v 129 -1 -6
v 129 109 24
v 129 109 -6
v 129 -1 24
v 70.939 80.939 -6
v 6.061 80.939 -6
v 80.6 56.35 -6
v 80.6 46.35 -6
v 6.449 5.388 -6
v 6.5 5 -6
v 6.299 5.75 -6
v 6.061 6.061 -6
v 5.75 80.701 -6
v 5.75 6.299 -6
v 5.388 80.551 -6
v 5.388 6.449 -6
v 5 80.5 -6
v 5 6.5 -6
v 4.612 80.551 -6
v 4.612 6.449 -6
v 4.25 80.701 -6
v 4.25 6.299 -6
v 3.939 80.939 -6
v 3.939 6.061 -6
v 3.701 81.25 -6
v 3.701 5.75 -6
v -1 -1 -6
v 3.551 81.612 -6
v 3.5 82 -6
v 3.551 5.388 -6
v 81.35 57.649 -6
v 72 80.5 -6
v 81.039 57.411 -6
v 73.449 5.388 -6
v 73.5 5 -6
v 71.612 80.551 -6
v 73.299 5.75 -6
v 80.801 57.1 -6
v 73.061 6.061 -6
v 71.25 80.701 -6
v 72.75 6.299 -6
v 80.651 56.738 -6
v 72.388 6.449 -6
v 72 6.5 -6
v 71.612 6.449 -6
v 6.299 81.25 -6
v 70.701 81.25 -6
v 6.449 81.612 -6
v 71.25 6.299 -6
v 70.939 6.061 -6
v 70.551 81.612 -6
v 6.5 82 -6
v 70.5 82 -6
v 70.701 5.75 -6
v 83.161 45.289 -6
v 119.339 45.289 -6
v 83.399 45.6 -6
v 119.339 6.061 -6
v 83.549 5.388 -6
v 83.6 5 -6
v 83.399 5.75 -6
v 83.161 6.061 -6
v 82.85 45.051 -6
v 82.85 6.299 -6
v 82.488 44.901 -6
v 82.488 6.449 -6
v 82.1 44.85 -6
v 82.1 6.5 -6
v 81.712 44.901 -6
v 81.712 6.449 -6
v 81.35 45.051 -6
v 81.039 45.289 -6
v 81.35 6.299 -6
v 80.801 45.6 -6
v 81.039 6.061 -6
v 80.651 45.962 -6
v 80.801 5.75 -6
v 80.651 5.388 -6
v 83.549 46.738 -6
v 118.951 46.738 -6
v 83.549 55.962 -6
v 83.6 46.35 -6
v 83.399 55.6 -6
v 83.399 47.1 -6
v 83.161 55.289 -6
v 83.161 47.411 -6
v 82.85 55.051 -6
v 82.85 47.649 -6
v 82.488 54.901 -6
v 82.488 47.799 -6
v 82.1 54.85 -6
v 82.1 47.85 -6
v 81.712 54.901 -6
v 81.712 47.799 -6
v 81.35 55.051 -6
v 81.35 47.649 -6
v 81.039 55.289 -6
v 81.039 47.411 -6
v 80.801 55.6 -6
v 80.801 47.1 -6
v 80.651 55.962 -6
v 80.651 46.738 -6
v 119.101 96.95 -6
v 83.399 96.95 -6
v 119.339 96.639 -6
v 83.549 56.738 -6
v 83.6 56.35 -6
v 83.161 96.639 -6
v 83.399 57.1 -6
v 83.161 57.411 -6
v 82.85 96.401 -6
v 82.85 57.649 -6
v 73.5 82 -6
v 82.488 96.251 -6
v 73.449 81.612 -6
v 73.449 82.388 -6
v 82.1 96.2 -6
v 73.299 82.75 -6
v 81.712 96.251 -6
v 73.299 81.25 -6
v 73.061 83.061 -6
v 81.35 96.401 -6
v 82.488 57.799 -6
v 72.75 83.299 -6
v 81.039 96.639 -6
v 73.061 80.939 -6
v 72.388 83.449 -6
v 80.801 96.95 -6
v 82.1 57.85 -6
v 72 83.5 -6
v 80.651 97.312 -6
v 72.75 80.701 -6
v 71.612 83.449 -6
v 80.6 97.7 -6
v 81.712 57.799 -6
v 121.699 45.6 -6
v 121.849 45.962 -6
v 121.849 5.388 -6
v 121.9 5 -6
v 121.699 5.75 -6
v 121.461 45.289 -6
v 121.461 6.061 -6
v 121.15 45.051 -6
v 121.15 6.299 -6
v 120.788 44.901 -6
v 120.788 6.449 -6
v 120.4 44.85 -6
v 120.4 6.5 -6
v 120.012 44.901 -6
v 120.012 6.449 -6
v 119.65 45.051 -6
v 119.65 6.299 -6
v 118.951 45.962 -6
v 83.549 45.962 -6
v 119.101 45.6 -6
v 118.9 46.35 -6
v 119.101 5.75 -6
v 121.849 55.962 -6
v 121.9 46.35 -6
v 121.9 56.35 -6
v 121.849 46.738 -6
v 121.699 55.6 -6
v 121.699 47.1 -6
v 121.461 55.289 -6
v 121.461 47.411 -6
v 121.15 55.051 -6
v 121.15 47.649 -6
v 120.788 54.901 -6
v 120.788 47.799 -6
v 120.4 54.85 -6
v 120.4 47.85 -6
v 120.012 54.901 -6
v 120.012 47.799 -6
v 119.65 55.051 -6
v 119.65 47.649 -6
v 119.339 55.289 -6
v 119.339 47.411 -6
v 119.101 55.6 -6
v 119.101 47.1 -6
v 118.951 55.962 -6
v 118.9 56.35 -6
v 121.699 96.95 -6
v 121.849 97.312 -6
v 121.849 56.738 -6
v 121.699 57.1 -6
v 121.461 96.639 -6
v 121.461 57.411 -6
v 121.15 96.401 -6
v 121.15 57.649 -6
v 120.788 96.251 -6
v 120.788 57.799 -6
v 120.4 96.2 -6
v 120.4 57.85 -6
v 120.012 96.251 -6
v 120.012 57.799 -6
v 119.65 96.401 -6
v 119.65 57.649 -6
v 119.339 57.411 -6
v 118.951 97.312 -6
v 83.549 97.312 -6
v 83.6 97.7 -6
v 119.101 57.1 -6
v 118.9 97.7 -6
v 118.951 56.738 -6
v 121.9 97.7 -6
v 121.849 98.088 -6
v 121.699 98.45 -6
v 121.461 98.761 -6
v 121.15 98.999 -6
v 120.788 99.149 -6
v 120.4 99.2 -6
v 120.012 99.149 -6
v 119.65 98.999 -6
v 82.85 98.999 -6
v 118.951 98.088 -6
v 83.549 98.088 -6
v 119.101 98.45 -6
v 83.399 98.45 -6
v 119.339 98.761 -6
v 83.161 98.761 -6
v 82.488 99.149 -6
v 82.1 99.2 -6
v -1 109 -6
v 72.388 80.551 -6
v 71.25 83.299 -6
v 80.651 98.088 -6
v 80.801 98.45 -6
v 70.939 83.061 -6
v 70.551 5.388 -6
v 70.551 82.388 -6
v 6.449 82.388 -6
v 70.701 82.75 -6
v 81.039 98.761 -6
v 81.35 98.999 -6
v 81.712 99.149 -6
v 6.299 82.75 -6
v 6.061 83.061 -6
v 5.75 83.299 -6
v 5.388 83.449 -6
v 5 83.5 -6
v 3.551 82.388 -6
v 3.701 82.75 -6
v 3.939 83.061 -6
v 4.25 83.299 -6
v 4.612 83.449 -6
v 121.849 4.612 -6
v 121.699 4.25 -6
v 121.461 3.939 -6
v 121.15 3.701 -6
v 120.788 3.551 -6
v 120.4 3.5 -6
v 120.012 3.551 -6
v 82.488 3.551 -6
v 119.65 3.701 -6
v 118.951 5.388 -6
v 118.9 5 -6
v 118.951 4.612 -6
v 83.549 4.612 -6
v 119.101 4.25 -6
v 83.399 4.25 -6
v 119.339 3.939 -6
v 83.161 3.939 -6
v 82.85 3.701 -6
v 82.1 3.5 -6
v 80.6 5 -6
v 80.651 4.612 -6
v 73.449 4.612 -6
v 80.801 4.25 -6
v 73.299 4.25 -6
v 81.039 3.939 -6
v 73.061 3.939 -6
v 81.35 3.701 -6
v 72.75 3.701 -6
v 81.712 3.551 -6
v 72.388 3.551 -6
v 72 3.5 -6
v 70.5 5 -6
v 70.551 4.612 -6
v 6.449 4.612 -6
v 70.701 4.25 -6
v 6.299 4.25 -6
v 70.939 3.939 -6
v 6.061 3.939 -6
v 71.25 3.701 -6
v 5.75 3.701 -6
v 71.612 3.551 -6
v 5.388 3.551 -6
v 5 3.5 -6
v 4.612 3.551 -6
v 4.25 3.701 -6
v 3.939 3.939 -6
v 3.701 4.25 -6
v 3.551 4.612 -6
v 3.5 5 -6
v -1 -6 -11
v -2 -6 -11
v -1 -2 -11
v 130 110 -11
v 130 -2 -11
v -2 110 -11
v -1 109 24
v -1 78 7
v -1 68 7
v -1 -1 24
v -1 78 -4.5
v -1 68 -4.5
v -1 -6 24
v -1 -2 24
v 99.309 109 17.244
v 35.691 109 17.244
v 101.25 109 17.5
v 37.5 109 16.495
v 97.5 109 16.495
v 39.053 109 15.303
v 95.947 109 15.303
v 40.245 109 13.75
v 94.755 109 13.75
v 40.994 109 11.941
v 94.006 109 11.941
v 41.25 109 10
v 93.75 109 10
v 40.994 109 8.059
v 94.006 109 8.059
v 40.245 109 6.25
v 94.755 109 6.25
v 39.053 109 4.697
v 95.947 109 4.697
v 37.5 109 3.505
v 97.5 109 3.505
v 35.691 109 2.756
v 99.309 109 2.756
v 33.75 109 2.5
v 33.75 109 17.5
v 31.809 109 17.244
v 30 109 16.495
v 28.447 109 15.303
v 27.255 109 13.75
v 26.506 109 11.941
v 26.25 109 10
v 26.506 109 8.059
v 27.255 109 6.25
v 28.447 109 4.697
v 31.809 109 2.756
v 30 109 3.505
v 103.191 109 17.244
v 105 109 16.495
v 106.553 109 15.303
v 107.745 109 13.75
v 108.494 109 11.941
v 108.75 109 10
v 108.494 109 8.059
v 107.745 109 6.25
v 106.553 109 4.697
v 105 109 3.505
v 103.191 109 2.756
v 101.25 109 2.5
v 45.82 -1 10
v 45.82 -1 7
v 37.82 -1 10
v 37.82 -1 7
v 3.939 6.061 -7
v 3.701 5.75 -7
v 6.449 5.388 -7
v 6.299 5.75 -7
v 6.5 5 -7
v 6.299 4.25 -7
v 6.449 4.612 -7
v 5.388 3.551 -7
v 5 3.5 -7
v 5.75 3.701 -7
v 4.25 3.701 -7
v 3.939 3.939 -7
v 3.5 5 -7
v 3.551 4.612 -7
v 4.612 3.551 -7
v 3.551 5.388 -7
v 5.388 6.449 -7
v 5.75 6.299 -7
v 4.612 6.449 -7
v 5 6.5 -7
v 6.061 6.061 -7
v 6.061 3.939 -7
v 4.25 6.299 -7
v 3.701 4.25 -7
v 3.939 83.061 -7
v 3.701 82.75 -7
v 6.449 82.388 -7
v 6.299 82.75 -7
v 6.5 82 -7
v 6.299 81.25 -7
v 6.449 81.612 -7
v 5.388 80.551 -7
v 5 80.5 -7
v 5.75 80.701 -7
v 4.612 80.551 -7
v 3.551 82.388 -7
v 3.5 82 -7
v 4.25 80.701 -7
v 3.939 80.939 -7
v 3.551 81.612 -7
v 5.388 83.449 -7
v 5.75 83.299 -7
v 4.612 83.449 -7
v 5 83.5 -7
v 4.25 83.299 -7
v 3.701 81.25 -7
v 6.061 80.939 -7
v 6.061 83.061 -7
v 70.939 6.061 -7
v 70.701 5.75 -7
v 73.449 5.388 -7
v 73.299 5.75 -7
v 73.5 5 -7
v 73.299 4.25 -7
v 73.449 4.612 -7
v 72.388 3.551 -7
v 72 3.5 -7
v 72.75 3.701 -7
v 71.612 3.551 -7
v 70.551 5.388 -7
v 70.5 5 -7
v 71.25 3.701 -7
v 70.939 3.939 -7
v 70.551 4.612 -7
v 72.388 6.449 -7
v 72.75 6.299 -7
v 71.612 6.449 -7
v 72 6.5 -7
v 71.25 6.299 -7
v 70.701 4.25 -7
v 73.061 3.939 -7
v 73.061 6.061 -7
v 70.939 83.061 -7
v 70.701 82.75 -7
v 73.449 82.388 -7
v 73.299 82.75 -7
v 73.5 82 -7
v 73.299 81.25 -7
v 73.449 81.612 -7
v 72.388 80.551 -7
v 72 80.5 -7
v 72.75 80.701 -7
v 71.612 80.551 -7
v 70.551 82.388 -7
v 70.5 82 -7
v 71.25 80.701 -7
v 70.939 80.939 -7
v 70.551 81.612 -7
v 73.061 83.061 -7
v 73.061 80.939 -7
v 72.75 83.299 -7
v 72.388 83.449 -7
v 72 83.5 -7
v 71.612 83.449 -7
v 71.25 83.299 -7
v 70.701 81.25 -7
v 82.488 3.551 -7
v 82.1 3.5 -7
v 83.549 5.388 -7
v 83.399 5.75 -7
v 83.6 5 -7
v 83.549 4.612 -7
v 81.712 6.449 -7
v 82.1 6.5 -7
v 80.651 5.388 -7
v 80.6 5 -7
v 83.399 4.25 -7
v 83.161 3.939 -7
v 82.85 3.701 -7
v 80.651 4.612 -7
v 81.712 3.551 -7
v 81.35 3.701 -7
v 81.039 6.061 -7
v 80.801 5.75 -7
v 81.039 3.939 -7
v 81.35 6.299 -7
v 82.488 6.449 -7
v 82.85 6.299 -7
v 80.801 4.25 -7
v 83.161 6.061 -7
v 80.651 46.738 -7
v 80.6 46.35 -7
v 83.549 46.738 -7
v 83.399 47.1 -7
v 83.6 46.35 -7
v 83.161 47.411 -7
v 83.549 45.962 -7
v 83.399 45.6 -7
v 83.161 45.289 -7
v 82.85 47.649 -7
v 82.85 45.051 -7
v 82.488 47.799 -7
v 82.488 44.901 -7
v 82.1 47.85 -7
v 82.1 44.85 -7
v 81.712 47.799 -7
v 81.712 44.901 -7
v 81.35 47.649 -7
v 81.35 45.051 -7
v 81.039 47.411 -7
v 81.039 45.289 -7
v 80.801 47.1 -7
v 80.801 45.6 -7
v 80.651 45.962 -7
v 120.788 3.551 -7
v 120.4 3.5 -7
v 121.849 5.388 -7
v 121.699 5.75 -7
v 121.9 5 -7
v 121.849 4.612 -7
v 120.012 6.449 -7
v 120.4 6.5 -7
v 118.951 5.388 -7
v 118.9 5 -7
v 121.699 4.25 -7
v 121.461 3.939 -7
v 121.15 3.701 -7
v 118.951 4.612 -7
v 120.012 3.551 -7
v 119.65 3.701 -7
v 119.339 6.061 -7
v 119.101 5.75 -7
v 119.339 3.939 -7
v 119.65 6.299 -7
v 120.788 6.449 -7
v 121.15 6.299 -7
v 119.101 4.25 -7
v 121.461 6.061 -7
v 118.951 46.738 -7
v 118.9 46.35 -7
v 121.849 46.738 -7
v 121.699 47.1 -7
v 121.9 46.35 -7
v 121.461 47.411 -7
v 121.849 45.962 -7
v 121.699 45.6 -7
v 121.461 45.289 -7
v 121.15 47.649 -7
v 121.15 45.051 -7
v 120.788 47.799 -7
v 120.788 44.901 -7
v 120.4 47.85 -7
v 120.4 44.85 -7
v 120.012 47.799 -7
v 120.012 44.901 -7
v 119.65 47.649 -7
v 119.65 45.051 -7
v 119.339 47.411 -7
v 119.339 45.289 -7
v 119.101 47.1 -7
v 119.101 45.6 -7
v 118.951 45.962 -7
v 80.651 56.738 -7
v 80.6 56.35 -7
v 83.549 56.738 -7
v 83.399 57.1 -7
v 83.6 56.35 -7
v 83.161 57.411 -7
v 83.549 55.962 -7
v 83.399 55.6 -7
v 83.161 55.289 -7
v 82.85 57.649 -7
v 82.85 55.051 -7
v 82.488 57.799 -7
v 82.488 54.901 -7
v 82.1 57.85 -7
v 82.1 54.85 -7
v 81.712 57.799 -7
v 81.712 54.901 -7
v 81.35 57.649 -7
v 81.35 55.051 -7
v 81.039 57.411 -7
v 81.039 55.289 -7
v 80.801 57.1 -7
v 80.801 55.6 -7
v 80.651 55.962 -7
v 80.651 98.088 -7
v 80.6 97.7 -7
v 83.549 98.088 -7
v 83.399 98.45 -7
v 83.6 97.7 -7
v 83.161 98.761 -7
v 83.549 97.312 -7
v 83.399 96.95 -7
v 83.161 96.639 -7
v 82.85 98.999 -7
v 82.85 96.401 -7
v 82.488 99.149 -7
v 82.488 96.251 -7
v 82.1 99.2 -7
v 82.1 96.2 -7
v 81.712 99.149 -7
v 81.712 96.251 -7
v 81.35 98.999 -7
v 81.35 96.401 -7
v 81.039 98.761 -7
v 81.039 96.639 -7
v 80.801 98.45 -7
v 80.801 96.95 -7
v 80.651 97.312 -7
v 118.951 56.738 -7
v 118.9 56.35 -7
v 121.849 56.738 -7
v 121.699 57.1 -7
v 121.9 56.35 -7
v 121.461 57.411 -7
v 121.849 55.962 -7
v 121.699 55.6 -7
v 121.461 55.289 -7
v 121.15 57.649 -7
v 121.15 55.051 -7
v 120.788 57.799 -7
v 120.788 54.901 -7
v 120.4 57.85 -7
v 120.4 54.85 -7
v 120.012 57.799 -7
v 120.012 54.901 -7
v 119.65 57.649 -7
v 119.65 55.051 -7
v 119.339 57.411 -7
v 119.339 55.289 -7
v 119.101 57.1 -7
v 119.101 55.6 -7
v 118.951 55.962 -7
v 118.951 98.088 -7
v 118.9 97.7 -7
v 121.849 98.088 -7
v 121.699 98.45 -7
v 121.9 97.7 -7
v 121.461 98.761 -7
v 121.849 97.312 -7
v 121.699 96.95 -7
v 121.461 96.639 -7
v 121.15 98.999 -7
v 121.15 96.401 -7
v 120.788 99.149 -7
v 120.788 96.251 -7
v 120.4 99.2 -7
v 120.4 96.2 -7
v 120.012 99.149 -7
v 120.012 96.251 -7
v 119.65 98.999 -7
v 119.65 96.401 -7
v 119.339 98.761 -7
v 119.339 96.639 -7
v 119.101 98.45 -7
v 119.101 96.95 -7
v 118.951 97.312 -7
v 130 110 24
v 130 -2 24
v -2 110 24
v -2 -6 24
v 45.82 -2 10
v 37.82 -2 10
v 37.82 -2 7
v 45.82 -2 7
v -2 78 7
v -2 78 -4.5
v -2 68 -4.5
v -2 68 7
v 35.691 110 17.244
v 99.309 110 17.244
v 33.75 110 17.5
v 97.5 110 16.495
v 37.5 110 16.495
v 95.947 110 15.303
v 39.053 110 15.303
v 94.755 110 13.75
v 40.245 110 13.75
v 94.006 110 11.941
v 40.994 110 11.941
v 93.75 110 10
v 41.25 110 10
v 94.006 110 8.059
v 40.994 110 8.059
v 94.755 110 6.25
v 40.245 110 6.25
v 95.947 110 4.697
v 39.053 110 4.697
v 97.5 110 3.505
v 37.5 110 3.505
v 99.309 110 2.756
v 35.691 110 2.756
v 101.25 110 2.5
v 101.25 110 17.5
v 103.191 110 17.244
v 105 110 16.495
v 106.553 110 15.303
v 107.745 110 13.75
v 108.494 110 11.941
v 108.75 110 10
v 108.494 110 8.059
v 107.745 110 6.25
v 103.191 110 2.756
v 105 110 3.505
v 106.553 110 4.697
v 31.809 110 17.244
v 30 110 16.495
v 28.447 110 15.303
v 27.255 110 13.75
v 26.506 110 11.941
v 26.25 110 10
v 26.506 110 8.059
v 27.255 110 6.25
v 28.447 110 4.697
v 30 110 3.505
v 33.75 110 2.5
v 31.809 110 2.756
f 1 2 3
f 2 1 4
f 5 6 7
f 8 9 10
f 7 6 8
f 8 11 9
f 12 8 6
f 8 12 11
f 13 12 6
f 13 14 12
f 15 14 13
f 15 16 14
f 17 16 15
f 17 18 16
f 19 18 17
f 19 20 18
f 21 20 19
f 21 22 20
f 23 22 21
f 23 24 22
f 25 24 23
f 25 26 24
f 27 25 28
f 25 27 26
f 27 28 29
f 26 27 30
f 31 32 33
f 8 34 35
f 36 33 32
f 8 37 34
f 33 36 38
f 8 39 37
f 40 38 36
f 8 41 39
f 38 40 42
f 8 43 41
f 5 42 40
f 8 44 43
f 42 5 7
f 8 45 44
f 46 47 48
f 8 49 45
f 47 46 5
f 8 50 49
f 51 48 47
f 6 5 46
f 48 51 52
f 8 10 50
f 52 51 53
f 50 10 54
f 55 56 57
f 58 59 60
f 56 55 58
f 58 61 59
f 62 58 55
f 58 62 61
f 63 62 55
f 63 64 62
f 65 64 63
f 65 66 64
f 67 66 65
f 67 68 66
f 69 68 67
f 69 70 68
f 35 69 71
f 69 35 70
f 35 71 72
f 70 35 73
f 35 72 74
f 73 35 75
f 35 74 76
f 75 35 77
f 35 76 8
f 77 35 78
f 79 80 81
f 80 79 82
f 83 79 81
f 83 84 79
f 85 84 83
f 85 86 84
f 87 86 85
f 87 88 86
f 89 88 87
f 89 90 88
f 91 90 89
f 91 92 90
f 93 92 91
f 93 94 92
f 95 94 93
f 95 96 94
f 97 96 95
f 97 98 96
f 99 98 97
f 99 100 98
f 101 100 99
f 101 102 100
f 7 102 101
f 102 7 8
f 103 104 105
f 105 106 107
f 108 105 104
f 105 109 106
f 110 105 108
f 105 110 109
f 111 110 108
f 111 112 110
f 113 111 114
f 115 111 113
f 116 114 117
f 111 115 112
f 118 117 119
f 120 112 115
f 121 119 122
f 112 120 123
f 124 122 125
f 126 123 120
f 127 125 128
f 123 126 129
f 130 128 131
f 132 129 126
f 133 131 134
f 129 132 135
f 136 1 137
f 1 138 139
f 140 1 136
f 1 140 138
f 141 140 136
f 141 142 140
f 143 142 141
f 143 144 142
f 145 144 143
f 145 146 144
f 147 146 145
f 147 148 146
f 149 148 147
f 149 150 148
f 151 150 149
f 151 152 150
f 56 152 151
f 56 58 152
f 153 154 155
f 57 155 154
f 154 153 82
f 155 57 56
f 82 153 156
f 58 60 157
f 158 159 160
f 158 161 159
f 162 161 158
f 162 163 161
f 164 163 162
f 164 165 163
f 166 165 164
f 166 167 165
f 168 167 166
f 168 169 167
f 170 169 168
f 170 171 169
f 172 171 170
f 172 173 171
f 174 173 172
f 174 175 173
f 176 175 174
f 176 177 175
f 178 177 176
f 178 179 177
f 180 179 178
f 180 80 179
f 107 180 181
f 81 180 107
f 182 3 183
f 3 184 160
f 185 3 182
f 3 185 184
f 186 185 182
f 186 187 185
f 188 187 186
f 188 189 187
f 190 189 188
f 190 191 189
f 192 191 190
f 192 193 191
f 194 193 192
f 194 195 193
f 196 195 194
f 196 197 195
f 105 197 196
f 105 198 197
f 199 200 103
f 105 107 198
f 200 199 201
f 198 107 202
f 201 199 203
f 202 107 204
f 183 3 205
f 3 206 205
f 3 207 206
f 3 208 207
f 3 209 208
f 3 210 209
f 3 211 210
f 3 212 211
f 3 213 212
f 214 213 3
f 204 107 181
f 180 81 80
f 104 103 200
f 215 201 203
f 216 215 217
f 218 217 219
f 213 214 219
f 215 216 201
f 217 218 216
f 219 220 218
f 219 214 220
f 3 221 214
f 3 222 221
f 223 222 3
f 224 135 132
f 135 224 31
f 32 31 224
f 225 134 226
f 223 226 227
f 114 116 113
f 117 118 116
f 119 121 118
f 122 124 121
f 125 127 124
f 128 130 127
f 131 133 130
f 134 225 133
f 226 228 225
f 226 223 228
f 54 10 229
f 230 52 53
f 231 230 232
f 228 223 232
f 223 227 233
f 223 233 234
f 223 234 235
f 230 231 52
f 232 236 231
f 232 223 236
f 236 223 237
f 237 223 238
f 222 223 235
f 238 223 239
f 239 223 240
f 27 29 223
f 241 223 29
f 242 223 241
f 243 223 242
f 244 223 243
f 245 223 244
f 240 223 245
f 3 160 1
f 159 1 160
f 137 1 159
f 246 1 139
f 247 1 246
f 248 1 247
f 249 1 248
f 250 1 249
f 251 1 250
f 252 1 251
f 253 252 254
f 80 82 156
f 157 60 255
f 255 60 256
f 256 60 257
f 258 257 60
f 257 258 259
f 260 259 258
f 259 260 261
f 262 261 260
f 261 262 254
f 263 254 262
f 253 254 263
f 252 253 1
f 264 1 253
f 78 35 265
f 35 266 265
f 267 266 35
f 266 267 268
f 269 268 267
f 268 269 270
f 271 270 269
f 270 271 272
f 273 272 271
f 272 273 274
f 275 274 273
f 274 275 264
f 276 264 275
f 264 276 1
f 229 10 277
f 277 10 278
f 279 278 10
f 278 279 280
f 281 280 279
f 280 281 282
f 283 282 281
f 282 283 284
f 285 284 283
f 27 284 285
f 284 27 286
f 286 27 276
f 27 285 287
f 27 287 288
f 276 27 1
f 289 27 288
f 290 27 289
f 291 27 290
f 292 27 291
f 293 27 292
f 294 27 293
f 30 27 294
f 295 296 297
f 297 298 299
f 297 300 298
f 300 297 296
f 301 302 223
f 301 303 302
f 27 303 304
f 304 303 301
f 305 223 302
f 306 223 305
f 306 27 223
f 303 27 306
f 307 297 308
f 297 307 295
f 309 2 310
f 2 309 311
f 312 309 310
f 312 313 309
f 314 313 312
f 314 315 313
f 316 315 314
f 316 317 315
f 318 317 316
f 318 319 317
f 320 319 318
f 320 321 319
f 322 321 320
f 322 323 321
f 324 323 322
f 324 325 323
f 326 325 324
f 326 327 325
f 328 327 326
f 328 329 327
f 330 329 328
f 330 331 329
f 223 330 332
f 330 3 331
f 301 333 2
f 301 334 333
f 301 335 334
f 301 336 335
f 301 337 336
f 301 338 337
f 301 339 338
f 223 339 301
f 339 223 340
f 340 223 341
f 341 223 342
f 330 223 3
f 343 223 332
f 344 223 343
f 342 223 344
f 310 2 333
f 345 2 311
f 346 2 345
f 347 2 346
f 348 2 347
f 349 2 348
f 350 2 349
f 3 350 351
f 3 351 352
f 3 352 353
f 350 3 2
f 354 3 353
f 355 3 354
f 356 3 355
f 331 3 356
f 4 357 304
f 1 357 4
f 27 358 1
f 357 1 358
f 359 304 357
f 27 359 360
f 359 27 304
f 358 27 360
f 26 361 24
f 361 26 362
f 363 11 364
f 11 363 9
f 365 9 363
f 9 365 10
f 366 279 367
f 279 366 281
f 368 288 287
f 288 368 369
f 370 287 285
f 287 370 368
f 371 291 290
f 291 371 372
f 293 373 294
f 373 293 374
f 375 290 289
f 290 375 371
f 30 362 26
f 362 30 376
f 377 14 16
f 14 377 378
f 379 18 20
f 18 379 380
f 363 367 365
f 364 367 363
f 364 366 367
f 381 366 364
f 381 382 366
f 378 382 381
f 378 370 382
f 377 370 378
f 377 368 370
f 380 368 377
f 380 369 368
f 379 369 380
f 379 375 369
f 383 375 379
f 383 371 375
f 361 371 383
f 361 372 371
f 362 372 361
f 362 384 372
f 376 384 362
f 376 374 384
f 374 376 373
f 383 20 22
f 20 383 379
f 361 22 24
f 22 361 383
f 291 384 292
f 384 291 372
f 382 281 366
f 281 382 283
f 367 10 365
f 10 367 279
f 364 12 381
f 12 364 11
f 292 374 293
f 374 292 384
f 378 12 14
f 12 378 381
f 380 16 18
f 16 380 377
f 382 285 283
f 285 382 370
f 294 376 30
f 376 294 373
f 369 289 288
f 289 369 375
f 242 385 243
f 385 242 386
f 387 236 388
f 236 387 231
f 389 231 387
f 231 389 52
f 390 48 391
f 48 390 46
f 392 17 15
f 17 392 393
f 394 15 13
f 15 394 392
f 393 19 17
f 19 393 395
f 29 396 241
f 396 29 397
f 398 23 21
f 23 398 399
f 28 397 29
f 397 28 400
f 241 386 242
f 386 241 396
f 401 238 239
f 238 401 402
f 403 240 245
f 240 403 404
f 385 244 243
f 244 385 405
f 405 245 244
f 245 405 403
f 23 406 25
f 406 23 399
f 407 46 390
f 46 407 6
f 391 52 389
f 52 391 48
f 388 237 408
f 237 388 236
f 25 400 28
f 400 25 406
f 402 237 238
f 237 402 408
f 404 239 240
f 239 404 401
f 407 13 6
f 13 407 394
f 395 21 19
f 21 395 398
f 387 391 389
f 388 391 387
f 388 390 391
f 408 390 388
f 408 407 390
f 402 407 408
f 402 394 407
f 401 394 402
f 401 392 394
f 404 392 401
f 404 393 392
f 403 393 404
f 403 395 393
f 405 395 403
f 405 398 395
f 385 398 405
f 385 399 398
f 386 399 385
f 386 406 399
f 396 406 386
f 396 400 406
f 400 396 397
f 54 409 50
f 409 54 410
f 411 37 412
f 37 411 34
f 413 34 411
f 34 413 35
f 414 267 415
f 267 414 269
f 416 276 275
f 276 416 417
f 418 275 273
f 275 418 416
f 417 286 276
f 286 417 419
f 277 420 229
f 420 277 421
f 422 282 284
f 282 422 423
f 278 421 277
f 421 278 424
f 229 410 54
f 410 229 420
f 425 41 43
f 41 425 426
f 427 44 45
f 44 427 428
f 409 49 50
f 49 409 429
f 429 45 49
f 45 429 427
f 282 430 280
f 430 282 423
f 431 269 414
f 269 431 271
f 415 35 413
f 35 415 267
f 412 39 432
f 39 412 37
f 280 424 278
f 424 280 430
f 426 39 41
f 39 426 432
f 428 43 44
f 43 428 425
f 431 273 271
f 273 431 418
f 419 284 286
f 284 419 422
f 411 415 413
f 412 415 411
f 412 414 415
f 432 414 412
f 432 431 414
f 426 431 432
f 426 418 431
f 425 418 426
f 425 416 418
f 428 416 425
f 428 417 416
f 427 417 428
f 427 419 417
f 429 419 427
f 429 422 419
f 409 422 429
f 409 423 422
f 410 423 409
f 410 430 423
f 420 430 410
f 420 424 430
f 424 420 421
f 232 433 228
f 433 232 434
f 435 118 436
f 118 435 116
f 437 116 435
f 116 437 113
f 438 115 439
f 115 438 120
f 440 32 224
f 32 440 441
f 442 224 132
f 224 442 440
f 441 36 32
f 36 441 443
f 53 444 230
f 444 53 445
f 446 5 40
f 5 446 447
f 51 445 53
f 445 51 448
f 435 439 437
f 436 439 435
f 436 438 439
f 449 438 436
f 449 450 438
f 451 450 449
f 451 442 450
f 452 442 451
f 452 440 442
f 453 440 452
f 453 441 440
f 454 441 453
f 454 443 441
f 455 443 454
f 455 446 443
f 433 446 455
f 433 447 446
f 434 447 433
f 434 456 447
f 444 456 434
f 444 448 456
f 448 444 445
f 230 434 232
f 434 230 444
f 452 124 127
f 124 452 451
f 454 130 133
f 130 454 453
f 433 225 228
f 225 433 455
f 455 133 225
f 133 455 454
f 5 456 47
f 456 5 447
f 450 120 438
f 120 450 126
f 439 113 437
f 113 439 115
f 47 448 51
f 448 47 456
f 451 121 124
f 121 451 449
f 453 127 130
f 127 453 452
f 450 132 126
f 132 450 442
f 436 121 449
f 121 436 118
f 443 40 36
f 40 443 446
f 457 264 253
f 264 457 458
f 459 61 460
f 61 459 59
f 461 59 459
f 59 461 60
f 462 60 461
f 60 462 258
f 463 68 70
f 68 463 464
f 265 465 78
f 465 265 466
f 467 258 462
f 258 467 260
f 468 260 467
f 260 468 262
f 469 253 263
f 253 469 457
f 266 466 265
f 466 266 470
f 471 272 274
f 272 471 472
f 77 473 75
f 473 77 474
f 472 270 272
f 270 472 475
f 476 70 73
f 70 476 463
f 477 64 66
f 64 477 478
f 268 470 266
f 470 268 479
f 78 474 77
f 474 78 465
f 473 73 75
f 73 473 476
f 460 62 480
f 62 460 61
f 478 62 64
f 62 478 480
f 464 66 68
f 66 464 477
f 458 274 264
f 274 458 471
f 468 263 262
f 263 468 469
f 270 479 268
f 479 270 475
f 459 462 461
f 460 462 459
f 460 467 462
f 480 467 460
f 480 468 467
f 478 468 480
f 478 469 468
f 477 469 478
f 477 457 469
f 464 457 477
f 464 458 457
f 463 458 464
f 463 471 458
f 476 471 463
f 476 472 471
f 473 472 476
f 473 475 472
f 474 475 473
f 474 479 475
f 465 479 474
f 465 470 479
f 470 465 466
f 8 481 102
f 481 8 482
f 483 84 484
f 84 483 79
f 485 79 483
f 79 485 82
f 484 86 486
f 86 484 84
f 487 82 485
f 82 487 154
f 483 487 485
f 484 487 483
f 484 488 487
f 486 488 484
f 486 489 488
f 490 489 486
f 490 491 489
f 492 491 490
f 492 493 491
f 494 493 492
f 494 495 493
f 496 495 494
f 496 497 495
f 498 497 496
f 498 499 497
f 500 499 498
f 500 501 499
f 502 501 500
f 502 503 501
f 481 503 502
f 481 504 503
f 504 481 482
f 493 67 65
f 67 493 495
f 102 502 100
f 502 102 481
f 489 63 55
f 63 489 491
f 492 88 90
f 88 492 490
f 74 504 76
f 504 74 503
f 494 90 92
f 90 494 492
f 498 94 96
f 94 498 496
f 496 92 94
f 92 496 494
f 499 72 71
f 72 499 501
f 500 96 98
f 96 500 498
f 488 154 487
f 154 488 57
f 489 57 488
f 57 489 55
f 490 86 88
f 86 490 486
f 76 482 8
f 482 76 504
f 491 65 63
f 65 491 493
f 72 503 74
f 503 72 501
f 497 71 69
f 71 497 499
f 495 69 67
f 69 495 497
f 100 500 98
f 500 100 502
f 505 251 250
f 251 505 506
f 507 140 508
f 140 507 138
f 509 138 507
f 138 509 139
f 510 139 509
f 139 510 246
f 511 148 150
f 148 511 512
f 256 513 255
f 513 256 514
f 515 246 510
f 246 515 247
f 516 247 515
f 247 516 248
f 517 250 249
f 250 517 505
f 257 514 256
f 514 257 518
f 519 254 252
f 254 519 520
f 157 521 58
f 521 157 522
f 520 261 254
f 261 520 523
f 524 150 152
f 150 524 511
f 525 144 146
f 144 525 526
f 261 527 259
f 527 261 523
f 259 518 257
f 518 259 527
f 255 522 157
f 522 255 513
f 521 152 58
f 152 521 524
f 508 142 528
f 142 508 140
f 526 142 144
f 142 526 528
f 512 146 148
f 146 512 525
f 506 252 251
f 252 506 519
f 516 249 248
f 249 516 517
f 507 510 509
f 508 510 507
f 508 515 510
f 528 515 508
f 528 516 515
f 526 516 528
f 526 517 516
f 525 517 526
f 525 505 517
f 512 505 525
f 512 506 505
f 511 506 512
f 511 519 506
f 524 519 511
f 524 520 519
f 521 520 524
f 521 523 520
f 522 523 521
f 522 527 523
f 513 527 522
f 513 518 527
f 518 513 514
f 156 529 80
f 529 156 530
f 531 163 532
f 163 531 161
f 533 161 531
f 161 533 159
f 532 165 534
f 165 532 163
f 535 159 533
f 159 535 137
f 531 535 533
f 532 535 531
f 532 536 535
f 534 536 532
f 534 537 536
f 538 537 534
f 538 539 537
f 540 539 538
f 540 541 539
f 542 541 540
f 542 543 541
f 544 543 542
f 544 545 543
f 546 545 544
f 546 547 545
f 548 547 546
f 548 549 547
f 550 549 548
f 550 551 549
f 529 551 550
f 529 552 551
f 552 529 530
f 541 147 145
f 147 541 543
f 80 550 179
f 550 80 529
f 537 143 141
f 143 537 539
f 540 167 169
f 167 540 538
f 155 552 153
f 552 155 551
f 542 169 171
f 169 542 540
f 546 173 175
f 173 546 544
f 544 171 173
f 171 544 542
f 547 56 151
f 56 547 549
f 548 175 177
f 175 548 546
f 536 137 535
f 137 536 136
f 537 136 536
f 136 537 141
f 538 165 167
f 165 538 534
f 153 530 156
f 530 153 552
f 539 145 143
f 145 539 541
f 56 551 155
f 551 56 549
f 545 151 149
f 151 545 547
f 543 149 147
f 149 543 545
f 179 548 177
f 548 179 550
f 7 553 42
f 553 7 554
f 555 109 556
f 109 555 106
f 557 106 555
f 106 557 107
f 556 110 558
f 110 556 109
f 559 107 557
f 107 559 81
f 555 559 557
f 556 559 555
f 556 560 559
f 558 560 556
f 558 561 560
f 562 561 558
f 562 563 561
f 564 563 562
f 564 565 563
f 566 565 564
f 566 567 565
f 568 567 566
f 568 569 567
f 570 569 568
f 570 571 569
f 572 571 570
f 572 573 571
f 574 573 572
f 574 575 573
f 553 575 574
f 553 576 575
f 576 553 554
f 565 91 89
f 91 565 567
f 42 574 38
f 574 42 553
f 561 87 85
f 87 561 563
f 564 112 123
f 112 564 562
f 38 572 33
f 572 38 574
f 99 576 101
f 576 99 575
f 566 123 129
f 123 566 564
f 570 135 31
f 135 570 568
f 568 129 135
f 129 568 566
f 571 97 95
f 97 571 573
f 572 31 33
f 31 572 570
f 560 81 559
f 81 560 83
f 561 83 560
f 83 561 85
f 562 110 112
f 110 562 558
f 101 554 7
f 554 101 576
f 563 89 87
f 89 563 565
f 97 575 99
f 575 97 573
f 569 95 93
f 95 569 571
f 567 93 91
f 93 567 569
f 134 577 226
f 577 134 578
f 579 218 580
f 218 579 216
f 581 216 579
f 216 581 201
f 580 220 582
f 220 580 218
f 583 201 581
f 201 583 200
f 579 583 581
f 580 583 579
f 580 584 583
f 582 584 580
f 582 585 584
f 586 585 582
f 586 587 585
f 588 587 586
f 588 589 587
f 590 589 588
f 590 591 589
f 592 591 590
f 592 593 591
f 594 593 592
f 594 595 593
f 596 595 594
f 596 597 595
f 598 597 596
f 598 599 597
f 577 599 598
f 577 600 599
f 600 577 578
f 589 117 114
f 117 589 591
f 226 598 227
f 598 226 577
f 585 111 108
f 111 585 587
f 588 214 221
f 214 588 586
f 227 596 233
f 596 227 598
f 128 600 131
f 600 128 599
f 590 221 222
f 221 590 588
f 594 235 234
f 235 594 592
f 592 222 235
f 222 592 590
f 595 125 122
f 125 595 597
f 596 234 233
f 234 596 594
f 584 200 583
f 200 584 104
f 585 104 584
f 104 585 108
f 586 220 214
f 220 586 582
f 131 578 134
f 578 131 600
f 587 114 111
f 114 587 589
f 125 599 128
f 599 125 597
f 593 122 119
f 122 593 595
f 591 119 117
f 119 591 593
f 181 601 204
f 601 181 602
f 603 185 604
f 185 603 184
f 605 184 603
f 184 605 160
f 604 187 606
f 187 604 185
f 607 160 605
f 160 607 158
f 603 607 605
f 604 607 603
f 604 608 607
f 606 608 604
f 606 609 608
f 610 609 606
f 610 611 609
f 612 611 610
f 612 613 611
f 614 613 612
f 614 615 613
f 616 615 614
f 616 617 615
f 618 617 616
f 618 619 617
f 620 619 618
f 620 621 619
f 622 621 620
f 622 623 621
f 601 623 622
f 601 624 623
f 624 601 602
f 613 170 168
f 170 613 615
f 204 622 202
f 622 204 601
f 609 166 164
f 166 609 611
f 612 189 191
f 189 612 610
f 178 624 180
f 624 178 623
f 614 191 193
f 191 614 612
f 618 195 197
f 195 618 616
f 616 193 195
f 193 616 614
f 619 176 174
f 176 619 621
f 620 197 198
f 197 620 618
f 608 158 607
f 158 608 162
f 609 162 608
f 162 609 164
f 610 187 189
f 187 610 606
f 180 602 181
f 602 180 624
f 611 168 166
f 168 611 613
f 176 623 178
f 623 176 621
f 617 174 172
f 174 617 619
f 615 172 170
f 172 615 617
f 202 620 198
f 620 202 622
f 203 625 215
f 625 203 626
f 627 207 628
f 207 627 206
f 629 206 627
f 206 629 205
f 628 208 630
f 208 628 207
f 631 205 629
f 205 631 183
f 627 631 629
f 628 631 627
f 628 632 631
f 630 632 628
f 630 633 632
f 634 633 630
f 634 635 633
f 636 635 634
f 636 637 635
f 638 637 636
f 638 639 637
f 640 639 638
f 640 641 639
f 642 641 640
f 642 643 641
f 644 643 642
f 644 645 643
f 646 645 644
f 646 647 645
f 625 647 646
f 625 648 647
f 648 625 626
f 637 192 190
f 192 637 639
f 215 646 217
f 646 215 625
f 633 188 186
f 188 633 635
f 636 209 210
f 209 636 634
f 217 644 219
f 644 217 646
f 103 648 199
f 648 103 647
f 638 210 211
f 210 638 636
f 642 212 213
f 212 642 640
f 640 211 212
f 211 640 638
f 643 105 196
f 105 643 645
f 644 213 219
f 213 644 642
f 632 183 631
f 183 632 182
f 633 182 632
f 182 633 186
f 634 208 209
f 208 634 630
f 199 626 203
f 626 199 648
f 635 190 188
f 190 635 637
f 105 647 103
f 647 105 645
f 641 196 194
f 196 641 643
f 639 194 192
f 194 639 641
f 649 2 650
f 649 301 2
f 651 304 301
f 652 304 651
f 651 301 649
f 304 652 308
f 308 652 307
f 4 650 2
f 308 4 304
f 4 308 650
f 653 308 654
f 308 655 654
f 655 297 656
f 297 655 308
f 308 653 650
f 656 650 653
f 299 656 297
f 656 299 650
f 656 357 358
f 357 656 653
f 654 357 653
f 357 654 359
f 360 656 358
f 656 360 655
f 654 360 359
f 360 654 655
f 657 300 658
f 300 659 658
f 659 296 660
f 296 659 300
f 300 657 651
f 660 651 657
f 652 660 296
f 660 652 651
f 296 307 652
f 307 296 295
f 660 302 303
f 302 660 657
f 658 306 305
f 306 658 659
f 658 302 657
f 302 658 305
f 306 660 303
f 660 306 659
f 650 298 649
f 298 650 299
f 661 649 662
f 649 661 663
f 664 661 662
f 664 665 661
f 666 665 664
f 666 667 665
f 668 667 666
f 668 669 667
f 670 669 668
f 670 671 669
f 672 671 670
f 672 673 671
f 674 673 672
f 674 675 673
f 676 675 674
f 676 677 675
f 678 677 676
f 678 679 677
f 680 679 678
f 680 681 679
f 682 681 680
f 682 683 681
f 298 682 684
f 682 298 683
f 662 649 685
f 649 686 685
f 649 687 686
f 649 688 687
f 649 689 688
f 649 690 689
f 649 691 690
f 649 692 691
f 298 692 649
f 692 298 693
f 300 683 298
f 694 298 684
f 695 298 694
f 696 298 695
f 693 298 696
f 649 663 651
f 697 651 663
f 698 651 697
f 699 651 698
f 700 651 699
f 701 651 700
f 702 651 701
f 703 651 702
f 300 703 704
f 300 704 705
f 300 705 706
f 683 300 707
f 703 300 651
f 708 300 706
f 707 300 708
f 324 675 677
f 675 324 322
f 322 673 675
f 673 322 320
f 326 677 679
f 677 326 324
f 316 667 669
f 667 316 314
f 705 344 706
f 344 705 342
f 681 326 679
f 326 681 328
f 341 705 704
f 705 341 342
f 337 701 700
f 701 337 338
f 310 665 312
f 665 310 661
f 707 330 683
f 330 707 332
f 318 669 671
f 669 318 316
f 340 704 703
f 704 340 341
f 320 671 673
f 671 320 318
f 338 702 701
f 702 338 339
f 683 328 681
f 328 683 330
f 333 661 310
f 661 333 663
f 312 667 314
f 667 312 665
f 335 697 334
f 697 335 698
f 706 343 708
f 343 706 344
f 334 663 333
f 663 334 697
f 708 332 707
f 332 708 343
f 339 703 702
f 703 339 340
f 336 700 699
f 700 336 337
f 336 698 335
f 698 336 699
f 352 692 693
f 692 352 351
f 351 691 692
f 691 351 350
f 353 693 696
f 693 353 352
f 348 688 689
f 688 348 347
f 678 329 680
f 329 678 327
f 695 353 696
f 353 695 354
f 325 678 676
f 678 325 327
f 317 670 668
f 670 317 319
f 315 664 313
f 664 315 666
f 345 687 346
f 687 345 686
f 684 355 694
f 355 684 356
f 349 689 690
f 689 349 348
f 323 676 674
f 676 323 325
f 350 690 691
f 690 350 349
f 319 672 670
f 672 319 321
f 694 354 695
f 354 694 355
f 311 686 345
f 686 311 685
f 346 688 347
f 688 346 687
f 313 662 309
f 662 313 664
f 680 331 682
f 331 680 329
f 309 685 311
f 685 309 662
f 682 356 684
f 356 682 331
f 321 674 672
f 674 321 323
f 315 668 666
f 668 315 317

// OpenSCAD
union(){
    //Base Layer
    difference(){
        $fs = 0.4;
        //Base
        translate([-1,-1,-11])
            cube([130,110,5]);
        //PCB1 Holes
        translate([5,5,-7])
            cylinder(h=3, d=3);
        translate([5,82,-7])
            cylinder(h=3, d=3);
        translate([72,5,-7])
            cylinder(h=3, d=3);
        translate([72,82,-7])
            cylinder(h=3, d=3);
        
        //PCB2 Holes
        translate([82.1,5,-7])
            cylinder(h=3, d=3);
        translate([82.1,46.35,-7])
            cylinder(h=3, d=3);
        translate([120.4,5,-7])
            cylinder(h=3, d=3);
        translate([120.4,46.35,-7])
            cylinder(h=3, d=3);
        //PCB3 Holes
        translate([82.1,56.35,-7])
            cylinder(h=3, d=3);
        translate([82.1,97.7,-7])
            cylinder(h=3, d=3);
        translate([120.4,56.35,-7])
            cylinder(h=3, d=3);
        translate([120.4,97.7,-7])
            cylinder(h=3, d=3);
        
        
        }

    //North Wall
    difference(){
        translate([-1,-2,-11])
            cube([130,1,35]);
        translate([37.82,-6,7])
            cube([8,5,3]);
    }
    //East Wall
    difference(){
        translate([-2,-6,-11])
            cube([1,115,35]);
        translate([-6,68,-4.5])
            cube([5,10,11.5]);
    }
    //South Wall ---Create hole for cable outlets 
    difference(){
        translate([-2,109,-11])
            cube([132,1,35]);
        translate([33.75,109,10])
            rotate([270,0,0])
            cylinder(h=5, d=15);
        translate([101.25,109,10])
            rotate([270,0,0])
            cylinder(h=5, d=15);
    }
    //West Wall
    translate([129,-2,-11])
        cube([1,112,35]);
}
